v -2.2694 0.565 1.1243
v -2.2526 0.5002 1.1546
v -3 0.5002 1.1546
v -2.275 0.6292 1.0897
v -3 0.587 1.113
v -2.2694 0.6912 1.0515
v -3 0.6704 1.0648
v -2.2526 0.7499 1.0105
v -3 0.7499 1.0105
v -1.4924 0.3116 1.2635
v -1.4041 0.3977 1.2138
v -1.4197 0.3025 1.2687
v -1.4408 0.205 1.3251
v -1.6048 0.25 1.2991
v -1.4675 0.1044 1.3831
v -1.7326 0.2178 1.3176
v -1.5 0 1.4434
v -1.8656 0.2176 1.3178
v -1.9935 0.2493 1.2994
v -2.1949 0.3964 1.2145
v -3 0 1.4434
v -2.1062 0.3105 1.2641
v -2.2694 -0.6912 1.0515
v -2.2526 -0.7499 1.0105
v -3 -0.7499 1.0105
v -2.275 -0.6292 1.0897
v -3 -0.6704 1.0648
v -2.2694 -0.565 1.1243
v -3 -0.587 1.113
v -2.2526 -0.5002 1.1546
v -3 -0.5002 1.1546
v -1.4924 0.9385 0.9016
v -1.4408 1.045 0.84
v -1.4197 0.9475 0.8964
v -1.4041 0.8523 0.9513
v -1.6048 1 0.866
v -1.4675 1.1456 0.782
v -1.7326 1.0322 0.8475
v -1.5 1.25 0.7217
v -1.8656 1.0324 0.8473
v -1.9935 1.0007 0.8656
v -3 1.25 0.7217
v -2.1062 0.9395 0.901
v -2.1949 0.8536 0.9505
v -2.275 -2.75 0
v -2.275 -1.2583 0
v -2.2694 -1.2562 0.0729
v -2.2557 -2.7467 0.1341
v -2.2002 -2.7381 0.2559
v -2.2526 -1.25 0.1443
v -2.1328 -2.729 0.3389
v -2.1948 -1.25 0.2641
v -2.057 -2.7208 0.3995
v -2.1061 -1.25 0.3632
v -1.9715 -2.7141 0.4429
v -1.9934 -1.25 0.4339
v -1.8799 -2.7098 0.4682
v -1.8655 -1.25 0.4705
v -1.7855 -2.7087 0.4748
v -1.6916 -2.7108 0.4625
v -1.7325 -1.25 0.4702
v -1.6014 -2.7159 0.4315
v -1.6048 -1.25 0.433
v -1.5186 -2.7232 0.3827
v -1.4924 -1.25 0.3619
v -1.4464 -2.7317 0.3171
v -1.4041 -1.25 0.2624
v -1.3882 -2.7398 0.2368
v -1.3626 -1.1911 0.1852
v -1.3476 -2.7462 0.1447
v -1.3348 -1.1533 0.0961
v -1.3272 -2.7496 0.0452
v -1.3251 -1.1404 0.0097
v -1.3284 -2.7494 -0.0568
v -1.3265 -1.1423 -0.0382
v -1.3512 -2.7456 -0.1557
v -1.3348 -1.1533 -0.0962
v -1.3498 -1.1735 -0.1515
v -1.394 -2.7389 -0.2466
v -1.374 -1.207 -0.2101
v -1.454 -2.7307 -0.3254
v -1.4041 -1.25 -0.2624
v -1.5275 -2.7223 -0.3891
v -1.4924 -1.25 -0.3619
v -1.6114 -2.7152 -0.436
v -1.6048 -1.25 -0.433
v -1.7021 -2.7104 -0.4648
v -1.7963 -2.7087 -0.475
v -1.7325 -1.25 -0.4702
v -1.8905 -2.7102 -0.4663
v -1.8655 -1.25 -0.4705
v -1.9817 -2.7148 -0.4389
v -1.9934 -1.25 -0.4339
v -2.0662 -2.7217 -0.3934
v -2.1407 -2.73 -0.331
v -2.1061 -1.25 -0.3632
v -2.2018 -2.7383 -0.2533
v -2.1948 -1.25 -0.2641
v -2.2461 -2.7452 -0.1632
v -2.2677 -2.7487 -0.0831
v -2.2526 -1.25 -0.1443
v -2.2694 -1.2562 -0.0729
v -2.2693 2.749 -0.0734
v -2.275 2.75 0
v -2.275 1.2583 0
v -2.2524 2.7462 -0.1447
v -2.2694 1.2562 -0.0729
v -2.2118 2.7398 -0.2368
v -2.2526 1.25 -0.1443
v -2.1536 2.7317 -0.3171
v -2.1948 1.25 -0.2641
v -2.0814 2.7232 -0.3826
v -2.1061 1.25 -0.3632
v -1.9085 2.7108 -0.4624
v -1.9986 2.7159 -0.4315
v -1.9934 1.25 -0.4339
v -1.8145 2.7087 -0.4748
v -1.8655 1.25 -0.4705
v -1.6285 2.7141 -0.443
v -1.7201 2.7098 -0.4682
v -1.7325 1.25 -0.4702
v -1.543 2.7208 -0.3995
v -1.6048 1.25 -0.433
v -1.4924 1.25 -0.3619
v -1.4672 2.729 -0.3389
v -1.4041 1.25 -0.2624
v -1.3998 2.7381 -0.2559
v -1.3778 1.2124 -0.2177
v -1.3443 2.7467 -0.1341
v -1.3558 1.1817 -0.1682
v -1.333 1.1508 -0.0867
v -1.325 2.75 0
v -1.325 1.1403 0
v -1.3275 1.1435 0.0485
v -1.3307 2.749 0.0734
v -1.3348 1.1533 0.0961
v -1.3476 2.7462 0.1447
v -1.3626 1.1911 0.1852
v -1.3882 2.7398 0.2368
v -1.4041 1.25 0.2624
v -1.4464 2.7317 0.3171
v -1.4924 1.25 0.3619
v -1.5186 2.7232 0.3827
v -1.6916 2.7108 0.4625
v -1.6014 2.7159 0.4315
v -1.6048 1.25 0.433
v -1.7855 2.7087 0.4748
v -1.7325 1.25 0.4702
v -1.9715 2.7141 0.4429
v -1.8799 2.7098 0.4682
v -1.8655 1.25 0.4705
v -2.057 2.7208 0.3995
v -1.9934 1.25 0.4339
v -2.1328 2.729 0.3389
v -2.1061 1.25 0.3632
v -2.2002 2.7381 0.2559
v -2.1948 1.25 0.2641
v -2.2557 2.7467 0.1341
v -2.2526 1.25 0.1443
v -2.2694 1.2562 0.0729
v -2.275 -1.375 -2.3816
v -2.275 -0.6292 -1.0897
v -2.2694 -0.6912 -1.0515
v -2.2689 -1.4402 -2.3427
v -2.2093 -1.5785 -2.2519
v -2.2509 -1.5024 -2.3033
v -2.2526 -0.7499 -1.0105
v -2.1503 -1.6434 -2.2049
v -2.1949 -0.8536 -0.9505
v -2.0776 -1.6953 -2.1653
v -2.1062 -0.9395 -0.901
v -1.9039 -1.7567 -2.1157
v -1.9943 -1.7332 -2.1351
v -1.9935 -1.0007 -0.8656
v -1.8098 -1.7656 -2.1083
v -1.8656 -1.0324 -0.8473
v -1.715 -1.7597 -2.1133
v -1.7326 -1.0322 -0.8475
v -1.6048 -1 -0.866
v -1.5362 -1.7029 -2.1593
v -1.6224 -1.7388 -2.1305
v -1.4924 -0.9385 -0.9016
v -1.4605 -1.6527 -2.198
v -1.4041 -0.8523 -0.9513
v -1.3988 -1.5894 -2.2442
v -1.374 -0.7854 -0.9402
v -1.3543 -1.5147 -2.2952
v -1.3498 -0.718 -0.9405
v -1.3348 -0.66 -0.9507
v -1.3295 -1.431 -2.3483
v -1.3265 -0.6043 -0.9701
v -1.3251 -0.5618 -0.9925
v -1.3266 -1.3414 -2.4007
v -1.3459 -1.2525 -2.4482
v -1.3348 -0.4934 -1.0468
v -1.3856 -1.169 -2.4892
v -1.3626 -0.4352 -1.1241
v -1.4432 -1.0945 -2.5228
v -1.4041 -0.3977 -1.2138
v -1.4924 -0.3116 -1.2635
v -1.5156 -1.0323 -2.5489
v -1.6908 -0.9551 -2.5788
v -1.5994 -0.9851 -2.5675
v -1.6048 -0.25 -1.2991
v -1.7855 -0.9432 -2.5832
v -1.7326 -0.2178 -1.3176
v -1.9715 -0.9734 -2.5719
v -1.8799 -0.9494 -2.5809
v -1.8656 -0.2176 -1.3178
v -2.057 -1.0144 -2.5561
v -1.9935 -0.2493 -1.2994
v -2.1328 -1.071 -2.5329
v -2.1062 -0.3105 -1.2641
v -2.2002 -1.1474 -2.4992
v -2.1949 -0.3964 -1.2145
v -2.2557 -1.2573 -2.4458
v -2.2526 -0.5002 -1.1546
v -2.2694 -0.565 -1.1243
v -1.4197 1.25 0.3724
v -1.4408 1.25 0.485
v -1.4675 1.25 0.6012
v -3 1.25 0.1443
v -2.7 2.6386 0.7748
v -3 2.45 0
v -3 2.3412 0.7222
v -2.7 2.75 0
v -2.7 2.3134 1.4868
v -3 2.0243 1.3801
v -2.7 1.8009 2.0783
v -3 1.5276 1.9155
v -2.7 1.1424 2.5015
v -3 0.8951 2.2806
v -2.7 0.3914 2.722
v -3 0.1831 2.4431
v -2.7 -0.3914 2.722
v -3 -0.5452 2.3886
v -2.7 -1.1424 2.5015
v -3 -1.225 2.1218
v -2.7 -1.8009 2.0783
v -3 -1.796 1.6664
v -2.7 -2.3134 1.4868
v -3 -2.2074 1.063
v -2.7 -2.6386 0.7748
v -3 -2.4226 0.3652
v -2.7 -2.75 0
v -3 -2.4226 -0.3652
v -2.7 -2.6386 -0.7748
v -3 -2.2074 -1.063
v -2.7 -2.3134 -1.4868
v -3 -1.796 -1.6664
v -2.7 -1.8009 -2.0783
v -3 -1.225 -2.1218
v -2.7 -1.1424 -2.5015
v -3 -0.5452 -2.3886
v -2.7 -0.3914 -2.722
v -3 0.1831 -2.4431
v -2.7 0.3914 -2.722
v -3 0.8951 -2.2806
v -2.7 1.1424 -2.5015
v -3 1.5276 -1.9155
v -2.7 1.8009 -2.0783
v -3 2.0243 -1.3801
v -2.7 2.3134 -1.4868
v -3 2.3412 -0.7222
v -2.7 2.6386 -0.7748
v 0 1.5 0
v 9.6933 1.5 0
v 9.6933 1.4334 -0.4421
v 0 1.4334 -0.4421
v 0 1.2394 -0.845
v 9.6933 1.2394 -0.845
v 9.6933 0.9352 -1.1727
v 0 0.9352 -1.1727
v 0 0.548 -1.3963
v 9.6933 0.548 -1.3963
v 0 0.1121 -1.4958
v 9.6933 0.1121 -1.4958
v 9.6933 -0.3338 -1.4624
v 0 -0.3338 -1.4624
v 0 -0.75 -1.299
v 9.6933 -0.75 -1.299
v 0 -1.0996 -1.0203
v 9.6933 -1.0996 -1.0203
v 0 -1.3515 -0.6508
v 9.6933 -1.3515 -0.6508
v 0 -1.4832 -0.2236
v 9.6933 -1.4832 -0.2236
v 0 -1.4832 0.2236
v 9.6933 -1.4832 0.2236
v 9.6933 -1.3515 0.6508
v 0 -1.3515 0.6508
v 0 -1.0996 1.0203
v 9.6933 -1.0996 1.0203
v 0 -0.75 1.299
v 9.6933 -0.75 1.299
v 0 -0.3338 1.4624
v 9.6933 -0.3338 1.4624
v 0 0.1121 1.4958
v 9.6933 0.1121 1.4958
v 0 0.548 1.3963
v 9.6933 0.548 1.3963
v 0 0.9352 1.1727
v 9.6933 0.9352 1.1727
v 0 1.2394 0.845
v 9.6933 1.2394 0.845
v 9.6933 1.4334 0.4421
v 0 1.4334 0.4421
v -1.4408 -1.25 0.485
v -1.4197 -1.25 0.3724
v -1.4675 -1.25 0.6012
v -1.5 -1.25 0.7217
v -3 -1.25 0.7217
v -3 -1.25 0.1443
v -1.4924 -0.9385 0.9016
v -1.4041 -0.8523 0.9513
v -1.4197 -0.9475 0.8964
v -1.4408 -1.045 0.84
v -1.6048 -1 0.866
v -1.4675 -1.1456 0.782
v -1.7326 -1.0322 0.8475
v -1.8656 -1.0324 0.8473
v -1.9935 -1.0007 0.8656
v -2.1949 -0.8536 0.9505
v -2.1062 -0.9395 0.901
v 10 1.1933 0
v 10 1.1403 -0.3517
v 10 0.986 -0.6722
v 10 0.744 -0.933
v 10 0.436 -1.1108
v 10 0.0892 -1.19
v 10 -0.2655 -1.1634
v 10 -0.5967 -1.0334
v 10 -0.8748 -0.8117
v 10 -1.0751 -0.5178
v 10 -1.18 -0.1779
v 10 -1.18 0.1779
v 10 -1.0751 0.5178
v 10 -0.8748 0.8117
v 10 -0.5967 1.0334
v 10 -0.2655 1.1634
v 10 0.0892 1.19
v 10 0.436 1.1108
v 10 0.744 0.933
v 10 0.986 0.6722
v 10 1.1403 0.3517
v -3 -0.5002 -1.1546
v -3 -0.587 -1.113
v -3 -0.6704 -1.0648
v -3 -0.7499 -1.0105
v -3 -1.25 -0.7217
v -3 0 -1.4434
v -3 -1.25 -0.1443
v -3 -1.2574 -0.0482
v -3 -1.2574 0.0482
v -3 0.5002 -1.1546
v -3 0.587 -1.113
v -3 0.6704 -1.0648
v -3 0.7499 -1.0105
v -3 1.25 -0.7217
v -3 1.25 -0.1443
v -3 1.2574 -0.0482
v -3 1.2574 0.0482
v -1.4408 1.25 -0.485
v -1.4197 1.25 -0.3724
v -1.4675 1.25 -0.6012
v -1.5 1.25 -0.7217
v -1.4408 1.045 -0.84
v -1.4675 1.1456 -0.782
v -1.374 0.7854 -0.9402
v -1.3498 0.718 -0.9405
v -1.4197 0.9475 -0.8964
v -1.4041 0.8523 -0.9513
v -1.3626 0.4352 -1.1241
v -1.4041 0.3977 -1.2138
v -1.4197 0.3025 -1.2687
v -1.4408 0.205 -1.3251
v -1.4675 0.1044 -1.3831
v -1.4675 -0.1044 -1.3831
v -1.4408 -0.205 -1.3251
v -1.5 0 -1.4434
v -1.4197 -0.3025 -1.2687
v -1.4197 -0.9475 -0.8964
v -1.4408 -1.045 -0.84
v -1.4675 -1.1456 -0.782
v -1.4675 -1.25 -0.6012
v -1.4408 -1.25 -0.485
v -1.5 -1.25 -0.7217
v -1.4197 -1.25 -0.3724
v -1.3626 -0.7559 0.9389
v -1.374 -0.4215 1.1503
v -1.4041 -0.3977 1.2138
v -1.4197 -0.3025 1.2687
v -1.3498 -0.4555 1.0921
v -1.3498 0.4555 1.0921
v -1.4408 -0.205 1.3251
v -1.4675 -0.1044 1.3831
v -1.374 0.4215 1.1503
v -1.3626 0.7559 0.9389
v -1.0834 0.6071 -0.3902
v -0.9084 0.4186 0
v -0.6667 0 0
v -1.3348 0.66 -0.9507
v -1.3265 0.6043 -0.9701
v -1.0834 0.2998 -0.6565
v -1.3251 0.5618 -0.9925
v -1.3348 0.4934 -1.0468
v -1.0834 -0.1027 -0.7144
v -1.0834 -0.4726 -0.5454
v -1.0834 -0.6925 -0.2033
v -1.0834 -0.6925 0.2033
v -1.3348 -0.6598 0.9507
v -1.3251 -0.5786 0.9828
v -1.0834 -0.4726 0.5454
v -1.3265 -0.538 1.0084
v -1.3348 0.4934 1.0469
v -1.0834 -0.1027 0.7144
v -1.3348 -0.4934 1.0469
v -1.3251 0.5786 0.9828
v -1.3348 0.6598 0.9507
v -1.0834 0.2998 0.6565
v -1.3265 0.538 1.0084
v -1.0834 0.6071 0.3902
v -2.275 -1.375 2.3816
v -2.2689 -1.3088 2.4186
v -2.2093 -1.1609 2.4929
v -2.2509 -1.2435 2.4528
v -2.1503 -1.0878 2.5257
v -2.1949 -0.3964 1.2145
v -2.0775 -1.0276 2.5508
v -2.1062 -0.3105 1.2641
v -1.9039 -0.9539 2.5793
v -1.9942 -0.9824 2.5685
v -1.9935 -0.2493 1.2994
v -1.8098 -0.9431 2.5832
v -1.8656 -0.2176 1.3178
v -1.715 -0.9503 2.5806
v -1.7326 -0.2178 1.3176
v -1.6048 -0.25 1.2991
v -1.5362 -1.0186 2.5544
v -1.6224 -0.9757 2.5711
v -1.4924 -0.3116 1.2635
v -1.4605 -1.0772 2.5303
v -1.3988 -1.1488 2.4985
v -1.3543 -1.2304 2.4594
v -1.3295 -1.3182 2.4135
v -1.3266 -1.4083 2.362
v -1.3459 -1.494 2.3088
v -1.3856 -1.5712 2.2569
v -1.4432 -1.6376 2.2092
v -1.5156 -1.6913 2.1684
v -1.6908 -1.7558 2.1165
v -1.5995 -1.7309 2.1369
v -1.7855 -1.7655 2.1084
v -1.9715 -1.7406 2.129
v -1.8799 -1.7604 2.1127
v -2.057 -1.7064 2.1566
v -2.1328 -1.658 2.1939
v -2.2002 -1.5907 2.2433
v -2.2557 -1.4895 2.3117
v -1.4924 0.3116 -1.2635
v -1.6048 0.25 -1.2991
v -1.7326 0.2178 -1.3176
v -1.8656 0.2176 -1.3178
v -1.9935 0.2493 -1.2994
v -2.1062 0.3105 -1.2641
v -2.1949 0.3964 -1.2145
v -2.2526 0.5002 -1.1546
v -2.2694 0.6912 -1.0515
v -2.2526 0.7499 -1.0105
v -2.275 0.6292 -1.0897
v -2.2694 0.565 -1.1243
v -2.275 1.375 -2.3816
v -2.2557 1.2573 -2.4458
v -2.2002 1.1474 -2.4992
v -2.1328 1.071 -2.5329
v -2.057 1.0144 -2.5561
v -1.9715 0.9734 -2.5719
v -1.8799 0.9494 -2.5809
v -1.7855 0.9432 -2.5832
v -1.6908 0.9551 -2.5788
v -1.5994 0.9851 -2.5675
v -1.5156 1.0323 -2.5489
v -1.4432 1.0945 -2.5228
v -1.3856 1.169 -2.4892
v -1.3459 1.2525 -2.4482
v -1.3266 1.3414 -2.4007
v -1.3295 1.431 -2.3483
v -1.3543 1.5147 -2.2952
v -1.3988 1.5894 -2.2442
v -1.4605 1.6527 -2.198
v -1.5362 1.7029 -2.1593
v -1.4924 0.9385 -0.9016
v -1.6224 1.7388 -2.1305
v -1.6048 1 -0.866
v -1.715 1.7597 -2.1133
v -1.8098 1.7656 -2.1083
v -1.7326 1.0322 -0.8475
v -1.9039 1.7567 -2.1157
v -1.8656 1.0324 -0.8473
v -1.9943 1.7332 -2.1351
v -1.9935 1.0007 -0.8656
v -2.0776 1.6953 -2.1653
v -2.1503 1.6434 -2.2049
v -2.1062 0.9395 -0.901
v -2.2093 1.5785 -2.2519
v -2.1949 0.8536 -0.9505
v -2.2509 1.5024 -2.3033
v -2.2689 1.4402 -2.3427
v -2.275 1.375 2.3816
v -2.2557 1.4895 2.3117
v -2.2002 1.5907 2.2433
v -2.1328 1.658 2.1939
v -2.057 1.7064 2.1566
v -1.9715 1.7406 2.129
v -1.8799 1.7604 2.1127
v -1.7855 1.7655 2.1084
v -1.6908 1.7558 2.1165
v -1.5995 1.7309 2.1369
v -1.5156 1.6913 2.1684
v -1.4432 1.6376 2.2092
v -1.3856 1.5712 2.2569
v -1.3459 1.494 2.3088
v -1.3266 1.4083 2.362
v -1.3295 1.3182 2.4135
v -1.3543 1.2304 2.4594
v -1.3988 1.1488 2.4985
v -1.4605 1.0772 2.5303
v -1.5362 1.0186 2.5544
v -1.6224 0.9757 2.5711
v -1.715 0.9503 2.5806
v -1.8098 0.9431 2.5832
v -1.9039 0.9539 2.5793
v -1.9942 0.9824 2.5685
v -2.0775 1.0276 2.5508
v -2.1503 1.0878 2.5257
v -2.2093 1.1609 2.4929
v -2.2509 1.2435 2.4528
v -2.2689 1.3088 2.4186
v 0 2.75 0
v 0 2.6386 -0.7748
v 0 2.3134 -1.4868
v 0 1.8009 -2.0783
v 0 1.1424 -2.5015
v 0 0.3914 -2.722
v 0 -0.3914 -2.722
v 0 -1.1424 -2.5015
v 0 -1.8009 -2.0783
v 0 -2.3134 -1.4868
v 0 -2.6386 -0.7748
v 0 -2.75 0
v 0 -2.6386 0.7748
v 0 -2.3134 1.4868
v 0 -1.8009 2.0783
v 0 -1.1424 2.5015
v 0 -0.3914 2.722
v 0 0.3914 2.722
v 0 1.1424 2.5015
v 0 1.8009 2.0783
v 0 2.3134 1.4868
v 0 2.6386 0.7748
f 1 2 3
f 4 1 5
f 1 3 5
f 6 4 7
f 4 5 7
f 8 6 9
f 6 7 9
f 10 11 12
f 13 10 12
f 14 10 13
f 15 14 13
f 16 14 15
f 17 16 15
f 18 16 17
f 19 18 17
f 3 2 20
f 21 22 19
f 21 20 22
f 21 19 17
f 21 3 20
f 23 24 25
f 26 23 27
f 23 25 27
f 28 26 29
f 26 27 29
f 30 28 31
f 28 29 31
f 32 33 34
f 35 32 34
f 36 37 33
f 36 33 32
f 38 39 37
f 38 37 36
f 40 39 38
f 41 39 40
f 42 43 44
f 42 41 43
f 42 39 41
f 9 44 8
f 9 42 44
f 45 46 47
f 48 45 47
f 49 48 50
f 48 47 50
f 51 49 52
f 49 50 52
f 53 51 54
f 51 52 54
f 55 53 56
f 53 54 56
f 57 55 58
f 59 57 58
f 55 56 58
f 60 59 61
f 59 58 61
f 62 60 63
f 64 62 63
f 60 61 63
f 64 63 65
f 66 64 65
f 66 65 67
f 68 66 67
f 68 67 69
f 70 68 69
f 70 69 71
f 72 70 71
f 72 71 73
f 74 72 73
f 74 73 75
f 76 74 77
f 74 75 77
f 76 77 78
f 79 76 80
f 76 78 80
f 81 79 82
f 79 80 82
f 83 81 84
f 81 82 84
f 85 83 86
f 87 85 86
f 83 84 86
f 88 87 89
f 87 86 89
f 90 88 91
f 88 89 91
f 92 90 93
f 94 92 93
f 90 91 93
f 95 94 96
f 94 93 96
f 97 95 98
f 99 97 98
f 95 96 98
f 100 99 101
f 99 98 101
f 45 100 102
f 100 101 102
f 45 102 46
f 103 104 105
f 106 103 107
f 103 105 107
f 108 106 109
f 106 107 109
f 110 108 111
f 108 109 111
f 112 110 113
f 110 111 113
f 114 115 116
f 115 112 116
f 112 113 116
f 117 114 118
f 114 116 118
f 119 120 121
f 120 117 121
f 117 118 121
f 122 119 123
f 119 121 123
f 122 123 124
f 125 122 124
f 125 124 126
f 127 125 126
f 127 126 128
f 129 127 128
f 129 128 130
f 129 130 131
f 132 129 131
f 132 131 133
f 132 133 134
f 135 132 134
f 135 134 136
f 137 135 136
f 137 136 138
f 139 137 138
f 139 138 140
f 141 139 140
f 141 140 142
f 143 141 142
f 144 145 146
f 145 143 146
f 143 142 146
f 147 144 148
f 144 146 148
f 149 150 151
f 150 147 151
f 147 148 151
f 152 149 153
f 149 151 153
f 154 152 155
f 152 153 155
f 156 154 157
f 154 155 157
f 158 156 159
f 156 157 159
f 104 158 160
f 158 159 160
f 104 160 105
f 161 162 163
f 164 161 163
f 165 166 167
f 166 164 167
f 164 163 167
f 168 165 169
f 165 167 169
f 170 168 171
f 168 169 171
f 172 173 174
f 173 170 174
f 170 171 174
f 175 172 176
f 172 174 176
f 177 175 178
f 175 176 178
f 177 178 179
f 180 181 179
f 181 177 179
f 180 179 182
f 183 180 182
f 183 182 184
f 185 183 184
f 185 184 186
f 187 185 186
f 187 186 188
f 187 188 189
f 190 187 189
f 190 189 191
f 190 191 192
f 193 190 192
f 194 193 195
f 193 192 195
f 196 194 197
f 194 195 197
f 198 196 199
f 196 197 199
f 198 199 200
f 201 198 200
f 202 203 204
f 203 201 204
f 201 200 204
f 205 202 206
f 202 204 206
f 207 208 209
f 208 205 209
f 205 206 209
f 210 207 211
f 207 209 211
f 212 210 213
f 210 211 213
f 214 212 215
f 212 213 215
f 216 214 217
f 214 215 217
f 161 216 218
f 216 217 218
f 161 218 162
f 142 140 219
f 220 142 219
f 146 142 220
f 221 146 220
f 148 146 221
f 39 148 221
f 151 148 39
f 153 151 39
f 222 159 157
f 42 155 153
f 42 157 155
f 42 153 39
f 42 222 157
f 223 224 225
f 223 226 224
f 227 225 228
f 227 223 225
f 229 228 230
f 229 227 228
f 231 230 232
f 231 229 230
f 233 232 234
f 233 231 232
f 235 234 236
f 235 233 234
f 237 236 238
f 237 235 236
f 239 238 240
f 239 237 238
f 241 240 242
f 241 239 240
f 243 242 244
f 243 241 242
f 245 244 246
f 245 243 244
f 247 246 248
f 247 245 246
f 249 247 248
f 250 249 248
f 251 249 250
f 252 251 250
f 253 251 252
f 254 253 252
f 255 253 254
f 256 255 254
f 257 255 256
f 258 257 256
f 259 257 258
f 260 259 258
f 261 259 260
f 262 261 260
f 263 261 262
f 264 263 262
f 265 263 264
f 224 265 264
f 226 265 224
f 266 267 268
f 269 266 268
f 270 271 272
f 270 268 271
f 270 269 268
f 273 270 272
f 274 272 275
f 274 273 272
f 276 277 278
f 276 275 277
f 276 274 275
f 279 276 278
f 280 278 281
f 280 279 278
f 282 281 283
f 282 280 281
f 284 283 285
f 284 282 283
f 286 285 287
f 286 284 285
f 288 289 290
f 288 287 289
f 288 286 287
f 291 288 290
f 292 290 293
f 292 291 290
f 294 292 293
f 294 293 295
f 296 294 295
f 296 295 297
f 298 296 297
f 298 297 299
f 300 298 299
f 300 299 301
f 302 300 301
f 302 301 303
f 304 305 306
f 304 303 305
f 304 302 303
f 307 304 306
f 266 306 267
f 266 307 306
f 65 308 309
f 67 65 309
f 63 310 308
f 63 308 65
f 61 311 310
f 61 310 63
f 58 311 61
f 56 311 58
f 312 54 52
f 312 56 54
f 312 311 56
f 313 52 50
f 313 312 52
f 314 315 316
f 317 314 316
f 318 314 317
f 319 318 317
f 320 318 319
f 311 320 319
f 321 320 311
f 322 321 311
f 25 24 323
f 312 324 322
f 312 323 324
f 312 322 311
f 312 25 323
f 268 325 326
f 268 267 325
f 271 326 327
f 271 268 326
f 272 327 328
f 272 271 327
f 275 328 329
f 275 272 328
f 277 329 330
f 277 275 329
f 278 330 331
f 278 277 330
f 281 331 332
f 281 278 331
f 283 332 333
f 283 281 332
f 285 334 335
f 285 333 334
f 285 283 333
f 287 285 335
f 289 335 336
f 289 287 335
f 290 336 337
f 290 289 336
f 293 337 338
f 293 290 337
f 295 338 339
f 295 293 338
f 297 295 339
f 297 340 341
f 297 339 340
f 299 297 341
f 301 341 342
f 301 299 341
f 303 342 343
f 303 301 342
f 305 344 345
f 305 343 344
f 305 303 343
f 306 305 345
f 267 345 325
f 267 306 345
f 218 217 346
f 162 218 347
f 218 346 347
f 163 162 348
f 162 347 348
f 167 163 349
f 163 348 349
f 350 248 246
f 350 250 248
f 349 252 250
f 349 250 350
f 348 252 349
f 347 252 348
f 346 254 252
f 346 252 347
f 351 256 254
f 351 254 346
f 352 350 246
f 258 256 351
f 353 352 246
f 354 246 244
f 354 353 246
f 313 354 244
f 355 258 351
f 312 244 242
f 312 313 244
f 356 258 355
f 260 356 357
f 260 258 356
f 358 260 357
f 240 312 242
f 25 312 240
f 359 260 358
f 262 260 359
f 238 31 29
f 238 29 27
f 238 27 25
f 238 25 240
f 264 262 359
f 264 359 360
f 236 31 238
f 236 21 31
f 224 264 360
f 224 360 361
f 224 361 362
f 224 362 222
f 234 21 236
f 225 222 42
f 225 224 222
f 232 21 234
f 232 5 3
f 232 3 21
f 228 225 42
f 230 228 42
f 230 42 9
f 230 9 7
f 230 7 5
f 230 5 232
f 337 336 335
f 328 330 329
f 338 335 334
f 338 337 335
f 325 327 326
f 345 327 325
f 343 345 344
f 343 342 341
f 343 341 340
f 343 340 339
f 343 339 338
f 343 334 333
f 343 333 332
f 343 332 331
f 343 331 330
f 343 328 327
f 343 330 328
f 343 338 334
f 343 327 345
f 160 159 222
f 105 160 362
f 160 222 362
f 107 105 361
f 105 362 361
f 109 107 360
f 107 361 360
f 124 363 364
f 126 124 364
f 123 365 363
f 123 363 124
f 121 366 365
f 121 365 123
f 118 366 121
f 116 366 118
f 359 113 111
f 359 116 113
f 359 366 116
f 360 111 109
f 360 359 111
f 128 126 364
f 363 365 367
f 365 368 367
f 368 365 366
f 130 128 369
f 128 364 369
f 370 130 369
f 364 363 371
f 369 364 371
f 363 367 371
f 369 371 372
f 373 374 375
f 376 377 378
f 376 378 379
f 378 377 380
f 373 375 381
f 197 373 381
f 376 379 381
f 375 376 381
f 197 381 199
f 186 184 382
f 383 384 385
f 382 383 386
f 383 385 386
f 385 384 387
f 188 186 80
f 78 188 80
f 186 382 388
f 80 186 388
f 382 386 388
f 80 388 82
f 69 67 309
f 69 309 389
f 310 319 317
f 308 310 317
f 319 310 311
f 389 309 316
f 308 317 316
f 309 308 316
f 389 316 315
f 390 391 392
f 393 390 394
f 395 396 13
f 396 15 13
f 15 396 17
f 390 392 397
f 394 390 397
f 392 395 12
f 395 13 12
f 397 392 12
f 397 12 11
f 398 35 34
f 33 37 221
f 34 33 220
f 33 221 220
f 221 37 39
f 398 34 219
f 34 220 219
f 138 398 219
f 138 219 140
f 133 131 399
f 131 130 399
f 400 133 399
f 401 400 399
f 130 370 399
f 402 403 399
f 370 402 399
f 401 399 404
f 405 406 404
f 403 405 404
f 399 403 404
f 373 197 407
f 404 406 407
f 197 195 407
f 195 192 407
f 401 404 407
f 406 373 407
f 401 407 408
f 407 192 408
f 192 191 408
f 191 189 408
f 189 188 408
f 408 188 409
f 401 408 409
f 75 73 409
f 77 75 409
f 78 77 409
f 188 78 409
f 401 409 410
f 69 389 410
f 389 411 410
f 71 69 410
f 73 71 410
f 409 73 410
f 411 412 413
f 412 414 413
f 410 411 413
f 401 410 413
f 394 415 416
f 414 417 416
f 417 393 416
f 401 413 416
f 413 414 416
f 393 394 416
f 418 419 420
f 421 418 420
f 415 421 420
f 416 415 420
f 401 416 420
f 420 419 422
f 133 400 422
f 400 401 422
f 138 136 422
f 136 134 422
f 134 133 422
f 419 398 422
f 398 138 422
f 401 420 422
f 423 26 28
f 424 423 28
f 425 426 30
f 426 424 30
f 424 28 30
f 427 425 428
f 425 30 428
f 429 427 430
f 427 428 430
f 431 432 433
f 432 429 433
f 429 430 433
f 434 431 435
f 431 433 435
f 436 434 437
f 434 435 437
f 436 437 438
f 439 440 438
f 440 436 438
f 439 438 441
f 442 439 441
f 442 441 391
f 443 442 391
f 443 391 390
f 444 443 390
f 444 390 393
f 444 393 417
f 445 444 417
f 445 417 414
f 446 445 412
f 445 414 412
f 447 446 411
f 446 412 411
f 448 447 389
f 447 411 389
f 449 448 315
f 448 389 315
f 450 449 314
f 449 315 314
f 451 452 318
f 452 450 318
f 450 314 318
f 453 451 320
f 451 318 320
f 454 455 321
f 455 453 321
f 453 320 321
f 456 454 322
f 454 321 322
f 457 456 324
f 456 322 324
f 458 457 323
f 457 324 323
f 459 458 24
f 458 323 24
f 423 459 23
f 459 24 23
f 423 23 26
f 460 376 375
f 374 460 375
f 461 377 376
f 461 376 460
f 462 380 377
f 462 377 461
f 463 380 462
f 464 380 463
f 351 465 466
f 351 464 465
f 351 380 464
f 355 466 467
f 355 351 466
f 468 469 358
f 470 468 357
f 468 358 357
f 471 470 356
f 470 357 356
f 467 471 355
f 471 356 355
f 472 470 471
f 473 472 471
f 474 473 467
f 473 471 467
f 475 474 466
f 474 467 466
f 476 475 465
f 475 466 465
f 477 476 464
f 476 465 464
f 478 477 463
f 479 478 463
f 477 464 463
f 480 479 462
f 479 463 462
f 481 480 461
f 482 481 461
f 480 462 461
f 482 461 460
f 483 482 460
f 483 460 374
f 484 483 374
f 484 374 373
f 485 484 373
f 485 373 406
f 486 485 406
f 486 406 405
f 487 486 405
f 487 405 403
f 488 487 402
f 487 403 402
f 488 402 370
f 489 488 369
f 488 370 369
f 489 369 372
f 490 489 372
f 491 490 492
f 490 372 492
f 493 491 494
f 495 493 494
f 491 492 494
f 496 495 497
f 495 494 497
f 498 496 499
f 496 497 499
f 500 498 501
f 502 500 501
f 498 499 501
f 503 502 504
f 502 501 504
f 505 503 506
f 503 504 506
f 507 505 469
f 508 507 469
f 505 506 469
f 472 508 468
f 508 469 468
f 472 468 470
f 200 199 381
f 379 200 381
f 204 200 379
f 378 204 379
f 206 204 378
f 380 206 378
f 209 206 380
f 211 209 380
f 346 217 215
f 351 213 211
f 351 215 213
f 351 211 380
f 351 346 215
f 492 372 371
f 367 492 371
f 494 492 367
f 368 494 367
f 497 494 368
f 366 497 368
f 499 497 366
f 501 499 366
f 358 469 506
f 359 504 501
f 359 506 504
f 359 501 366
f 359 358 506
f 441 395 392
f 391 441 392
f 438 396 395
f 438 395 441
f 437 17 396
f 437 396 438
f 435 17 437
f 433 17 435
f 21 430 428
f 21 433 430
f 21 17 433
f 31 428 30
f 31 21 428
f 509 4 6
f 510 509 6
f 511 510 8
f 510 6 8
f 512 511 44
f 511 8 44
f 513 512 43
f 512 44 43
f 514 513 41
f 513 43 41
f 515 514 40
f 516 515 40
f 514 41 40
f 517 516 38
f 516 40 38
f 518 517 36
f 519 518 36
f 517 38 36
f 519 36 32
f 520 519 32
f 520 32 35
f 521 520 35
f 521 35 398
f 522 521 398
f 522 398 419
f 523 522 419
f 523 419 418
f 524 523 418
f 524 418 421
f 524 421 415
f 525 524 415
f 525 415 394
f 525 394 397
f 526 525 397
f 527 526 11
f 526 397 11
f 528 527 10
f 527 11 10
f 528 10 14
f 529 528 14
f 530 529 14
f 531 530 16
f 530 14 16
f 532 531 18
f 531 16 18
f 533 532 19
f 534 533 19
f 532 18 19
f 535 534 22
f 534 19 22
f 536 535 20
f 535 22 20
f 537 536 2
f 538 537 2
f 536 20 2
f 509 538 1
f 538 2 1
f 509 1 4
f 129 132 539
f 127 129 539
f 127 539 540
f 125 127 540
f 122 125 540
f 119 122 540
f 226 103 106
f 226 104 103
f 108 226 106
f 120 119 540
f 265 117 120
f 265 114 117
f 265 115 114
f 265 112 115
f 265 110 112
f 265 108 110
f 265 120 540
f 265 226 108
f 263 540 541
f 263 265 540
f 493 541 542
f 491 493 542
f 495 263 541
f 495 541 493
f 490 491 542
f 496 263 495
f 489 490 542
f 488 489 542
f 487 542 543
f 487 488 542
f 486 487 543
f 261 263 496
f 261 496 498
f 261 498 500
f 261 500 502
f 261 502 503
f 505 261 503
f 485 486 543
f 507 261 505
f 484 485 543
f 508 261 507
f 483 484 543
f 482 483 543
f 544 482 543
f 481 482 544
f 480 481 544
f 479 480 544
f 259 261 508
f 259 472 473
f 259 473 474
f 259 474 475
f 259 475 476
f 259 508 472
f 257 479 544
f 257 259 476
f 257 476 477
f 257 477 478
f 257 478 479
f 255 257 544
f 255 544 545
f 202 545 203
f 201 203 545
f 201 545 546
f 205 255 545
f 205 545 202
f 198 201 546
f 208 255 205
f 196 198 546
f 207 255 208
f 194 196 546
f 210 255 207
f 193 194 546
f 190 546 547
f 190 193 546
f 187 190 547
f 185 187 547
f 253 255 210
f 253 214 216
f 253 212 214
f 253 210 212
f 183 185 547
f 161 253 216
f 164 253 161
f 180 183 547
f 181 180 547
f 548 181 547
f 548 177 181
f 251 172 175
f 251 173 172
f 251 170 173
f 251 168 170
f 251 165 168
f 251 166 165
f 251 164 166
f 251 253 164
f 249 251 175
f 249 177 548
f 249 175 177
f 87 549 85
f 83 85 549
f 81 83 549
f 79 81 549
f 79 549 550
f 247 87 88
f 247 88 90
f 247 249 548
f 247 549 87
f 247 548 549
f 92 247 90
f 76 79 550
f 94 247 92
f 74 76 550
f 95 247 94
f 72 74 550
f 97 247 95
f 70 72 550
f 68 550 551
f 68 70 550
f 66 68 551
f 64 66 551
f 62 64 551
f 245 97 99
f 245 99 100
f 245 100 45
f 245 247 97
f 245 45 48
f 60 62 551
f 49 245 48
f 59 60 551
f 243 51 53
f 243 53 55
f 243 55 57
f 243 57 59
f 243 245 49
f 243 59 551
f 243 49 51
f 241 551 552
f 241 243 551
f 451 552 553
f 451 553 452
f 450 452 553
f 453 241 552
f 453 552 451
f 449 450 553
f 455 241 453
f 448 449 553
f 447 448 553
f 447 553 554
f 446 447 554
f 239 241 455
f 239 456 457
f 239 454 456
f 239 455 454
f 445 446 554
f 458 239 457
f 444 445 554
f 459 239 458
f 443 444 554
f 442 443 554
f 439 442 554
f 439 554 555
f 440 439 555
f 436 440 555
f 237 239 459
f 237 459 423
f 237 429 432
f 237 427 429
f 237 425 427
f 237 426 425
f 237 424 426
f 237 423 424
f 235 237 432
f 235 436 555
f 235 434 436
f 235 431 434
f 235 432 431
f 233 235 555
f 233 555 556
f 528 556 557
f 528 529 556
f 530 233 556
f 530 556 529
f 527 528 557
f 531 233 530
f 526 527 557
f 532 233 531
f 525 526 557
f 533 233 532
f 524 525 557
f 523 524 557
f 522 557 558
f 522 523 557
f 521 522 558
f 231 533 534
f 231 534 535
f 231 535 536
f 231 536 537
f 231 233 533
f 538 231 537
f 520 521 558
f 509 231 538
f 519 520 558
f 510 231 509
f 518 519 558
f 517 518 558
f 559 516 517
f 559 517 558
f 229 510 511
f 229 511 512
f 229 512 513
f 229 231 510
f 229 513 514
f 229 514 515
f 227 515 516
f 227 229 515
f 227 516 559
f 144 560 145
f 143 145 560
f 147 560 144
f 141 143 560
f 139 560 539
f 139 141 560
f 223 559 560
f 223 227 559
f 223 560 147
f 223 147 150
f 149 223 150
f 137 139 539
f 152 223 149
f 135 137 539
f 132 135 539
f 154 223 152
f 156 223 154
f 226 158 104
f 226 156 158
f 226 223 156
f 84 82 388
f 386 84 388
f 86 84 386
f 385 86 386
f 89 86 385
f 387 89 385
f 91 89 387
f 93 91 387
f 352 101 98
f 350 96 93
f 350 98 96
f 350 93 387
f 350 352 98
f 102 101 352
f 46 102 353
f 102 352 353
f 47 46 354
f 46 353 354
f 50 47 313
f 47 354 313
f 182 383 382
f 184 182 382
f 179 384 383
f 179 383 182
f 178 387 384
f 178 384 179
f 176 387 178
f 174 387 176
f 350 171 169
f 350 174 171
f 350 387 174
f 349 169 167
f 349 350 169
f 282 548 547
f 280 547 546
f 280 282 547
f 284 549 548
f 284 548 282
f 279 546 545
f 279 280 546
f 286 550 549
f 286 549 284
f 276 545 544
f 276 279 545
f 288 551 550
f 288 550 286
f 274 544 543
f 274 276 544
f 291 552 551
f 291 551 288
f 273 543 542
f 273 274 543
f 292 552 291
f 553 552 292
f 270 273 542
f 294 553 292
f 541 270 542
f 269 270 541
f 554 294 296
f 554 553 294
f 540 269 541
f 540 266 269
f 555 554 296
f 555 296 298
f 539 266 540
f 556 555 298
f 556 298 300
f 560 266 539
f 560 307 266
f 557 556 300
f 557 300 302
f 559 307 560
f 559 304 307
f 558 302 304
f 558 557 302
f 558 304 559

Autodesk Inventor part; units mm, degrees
ref_plane "YZ Plane" through (0, 0, 0) normal (1, 0, 0) x (0, 1, 0)
ref_plane "XZ Plane" through (0, 0, 0) normal (0, 1, 0) x (-1, 0, 0)
sketch "Sketch1" plane through (0, 0, 0) normal (0, 0, 1) x (1, 0, 0)
  line L0 (-0.6667, 0) -> (10, 0)
  line L1 (10, 0) -> (10, 1.5)
  line L2 (10, 1.5) -> (0, 1.5)
  line L3 (0, 1.5) -> (0, 2.75)
  line L4 (0, 2.75) -> (-3, 2.75)
  line L5 (-3, 2.75) -> (-3, 1.4434)
  line L6 (-3, 1.4434) -> (-1.5, 1.4434)
  line L7 (-1.5, 1.4434) -> (-0.6667, 0)
  line L8 (-25.4, 0) -> (68.4, 0) projected
  line L9 (0, -1.8) -> (0, 10.8) projected
  dimension "d3" = 3
  dimension "d4" = 1.5
  dimension "d5" = 60
  dimension "d6" = 3
  dimension "d8" = 2.8868
  dimension "d9" = 5.5
  dimension "d31" = 10
revolve "Body" add sketch "Sketch1" angle 360 about axis through (-0.6667, 0, 0) along (1, 0, 0)
sketch "Sketch2" plane through (-3, 0, 0) normal (-1, 0, 0) x (0, 0, 1)
  circle A0 centre (0, 0) radius 1.4434 projected
  line L0 (0, -8.0829) -> (0, 8.0829) projected
  line L1 (-8.0829, 0) -> (8.0829, 0) projected
  line L2 (1.4434, 0) -> (0.7217, -1.25)
  line L3 (0.7217, -1.25) -> (-0.7217, -1.25)
  line L4 (-0.7217, -1.25) -> (-1.4434, 0)
  line L5 (-1.4434, 0) -> (-0.7217, 1.25)
  line L6 (-0.7217, 1.25) -> (0.7217, 1.25)
  line L7 (0.7217, 1.25) -> (1.4434, 0)
extrude "Slot" add sketch "Sketch2" against normal up to next contours L7 A0 | A0 L2 | L6 L0 A0 | A0 L0 L3 | L0 L6 A0 | A0 L3 L0 | L4 A0 | A0 L5
sketch "Sketch3" plane through (-3, 0, 0) normal (-1, 0, 0) x (0, 0, 1)
  circle A0 centre (0, 0) radius 2.75 projected
  line L0 (-0.7217, 1.25) -> (0.7217, 1.25) projected
  circle A1 centre (0, 0) radius 1.2583
  point P0 (-0.1443, 1.25)
  point P1 (0.1443, 1.25)
  dimension "d23" = 0.2887
extrude "Overcut" cut sketch "Sketch3" against normal blind 1.5 contours A1 L0 | L0 A1
sketch "Sketch4" plane through (0, 0, 0) normal (0, 1, 0) x (-1, 0, 0)
  line L0 (0, 2.75) -> (0, -2.75) projected
  line L1 (14.4, 0) -> (-2.4, 0) projected
  circle A0 centre (1.8, 0) radius 0.475
  line L2 (3, 2.75) -> (3, -2.75) projected
  point P0 (0, 0)
  dimension "d13" = 0.95
  dimension "d14" = 1.2
extrude "Hole" cut sketch "Sketch4" along normal through all both and the other way through all
pattern_circular "Holes" count 3 over 360 about axis through (5, 0, 0) along (1, 0, 0) of "Hole"
chamfer "Chamfer1" distance 0.3 angle 45 1 edges at (-3, -2.75, 0) measured on face at (-1.5904, -2.2485, -1.5833)
thread "Thread" size "1/2-13 UNC" class "1A" standard "ANSI Unified Screw Threads" length 9
chamfer "Chamfer2" distance 0.3067 distance2 0.3067 1 edges at (10, -1.5, 0) measured on face at (10, -0.6587, -0.1791)
ref_plane "Work Plane1" through (5, 0, 0) normal (0, 0.5, 0.866) x (1, 0, 0)
equation "\"d3\" = KOH"
equation "\"d4\" = STI"
equation "\"d6\" = GD"
equation "\"d8\" = 1.1547 * SW"
equation "\"d9\" = KOD"
equation "\"d31\" = NLG"
equation "\"d23\" = 0.11547 * SW"
equation "\"d24\" = STI"
equation "\"d13\" = BOR"
equation "\"d14\" = DIST"
equation "\"d17\" = PHH"
equation "\"d32\" = PHH"
equation "\"d19\" = GEL"
equation "\"d21\" = -0.5 * SPD + 0.5 * GD"
equation "\"d22\" = GUL"
equation "\"GD\" = NND"
equation "\"NLG\" = 10"
equation "\"GEL\" = 9"
equation "\"KOD\" = 5.5"
equation "\"KOH\" = 3"
equation "\"GUL\" = 0.61345 * PTC"
equation "\"SW\" = 2.5"
equation "\"STI\" = 1.5"
equation "\"DIST\" = 1.2"
equation "\"BOR\" = 0.95"
equation "\"PHH\" = 0.3"
equation "\"SPD\" = 2.38655"
equation "\"PTC\" = 0.5"
equation "\"THREADDIA\" = 3"
equation "\"TOA\" = 30deg"
equation "\"BDM\" = NND"
equation "\"NND\" = 3"
equation "\"E0\" = 1.155 * SW"
equation "\"GAL\" = 0.61345 * PTC"
equation "\"GD1\" = THREADDIA - 1.2269 * PTC"
properties part number "ANSI B18.3.1M - M3x0,5 x 10" material "Steel, Mild"
